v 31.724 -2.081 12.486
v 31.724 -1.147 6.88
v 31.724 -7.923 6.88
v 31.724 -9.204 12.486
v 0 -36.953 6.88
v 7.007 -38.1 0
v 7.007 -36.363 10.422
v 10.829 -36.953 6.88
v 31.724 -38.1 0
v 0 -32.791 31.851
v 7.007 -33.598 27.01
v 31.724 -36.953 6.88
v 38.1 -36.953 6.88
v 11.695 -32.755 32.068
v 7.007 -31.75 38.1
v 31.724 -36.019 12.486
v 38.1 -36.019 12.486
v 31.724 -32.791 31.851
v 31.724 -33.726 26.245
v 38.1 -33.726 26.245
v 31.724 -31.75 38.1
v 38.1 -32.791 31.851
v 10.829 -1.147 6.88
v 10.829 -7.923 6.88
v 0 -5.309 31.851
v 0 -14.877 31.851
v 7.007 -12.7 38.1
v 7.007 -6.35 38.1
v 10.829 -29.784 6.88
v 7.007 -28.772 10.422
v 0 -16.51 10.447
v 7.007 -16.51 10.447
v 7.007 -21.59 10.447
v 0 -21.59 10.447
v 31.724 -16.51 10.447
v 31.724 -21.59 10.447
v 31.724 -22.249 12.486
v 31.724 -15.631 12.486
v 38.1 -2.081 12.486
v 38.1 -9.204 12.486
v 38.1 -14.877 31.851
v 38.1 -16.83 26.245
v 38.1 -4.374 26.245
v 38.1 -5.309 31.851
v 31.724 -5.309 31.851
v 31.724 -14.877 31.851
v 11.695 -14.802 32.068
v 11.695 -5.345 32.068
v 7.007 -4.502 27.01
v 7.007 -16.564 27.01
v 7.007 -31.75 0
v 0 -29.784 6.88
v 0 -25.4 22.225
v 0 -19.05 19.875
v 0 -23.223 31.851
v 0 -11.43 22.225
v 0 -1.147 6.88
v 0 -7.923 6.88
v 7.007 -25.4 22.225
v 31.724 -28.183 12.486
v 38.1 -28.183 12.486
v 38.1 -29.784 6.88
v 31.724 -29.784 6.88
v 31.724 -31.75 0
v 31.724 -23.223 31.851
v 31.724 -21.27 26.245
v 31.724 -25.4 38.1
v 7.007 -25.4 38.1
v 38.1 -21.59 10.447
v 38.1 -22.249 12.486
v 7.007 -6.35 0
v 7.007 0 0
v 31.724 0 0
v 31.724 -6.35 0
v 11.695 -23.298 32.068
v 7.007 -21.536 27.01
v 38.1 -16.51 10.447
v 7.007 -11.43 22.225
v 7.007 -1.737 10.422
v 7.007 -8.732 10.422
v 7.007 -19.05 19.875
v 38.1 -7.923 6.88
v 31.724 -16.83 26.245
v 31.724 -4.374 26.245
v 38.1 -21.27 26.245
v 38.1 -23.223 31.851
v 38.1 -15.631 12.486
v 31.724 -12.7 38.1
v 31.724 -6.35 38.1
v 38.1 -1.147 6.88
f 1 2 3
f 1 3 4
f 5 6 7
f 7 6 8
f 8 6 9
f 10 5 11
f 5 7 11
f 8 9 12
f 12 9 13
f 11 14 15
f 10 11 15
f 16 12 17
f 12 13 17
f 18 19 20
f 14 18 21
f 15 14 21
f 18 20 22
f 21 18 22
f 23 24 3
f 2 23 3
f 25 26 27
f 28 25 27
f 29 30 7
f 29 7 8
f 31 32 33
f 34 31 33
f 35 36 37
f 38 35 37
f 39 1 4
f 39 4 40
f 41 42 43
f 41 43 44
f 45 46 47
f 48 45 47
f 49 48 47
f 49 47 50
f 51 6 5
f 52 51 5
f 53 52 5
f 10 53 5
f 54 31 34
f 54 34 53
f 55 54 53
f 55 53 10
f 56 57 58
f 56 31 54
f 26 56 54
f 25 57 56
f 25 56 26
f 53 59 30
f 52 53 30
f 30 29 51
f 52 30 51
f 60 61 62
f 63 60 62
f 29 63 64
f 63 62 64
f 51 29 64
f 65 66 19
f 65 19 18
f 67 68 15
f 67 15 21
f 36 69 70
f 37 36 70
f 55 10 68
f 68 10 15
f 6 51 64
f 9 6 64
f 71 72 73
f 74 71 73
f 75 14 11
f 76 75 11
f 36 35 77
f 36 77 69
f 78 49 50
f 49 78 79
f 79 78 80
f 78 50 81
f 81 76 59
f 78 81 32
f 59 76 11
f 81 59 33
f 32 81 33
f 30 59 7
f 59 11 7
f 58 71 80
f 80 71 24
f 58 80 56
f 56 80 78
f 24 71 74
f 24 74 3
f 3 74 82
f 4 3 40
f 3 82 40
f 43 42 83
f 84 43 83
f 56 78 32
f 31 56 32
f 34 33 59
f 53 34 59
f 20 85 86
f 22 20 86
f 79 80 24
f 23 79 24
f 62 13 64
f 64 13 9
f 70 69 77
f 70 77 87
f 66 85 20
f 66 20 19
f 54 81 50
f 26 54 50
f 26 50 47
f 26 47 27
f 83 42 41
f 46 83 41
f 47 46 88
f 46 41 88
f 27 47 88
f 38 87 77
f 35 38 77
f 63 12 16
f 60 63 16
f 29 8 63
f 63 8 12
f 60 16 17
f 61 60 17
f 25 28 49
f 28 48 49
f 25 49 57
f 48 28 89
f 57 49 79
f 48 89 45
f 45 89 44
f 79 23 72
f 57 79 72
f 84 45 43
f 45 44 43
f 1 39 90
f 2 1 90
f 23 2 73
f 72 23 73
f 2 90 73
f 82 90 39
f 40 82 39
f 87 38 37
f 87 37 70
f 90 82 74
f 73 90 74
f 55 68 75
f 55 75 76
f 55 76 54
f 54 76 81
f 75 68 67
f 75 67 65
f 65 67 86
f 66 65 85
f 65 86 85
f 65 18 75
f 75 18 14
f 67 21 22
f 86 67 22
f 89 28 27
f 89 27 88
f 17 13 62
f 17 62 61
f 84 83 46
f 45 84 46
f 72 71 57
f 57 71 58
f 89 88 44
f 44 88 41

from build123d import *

# Parameters (mm, degrees)
F0_W     = 38.1
F0_H     = 38.1
F1_DEPTH = 38.1
F5_DEPTH = 38.1
F7_DEPTH = 38.1


with BuildPart() as f1:
    # F0 (on Front) → F1 (new body)
    with BuildSketch(Plane.XZ):
        with Locations((19.05, 19.05)):
            Rectangle(F0_W, F0_H)
    extrude(amount=F1_DEPTH)

    # F4 (on offset) → F5 (cut)
    with BuildSketch(Plane.YZ.offset(38.1)):
        Polygon((-38.1, 38.1), (-38.1, 0), (-31.75, 38.1), align=None)
        Polygon((-19.05, 19.875096), (-12.7, 38.1), (-25.4, 38.1), align=None)
        Polygon((-6.35, 38.1), (0, 0), (0, 38.1), align=None)
        Polygon((-31.75, 0), (-6.35, 0), (-11.43, 22.225), (-16.51, 10.447165), (-21.59, 10.447165), (-25.4, 22.225), align=None)
    extrude(amount=-F5_DEPTH, mode=Mode.SUBTRACT)

    # F6 (on offset) → F7 (cut)
    with BuildSketch(Plane.XZ.offset(38.1)):
        Polygon((0, 38.1), (0, 31.851117), (7.007245, 38.1), align=None)
        Polygon((0, 6.879841), (0, 0), (7.007245, 0), align=None)
        Polygon((38.1, 38.1), (31.723712, 38.1), (38.1, 31.851117), align=None)
        Polygon((38.1, 6.879841), (31.723712, 0), (38.1, 0), align=None)
        Polygon((31.723712, 12.485636), (38.1, 12.485636), (38.1, 26.24532), (31.723712, 26.24532), (31.723712, 31.851117), (11.695193, 32.067911), (7.007245, 27.009744), (7.007245, 10.422225), (10.829381, 6.879841), (31.723712, 6.879841), align=None)
    extrude(amount=-F7_DEPTH, mode=Mode.SUBTRACT)


solid = f1.part
